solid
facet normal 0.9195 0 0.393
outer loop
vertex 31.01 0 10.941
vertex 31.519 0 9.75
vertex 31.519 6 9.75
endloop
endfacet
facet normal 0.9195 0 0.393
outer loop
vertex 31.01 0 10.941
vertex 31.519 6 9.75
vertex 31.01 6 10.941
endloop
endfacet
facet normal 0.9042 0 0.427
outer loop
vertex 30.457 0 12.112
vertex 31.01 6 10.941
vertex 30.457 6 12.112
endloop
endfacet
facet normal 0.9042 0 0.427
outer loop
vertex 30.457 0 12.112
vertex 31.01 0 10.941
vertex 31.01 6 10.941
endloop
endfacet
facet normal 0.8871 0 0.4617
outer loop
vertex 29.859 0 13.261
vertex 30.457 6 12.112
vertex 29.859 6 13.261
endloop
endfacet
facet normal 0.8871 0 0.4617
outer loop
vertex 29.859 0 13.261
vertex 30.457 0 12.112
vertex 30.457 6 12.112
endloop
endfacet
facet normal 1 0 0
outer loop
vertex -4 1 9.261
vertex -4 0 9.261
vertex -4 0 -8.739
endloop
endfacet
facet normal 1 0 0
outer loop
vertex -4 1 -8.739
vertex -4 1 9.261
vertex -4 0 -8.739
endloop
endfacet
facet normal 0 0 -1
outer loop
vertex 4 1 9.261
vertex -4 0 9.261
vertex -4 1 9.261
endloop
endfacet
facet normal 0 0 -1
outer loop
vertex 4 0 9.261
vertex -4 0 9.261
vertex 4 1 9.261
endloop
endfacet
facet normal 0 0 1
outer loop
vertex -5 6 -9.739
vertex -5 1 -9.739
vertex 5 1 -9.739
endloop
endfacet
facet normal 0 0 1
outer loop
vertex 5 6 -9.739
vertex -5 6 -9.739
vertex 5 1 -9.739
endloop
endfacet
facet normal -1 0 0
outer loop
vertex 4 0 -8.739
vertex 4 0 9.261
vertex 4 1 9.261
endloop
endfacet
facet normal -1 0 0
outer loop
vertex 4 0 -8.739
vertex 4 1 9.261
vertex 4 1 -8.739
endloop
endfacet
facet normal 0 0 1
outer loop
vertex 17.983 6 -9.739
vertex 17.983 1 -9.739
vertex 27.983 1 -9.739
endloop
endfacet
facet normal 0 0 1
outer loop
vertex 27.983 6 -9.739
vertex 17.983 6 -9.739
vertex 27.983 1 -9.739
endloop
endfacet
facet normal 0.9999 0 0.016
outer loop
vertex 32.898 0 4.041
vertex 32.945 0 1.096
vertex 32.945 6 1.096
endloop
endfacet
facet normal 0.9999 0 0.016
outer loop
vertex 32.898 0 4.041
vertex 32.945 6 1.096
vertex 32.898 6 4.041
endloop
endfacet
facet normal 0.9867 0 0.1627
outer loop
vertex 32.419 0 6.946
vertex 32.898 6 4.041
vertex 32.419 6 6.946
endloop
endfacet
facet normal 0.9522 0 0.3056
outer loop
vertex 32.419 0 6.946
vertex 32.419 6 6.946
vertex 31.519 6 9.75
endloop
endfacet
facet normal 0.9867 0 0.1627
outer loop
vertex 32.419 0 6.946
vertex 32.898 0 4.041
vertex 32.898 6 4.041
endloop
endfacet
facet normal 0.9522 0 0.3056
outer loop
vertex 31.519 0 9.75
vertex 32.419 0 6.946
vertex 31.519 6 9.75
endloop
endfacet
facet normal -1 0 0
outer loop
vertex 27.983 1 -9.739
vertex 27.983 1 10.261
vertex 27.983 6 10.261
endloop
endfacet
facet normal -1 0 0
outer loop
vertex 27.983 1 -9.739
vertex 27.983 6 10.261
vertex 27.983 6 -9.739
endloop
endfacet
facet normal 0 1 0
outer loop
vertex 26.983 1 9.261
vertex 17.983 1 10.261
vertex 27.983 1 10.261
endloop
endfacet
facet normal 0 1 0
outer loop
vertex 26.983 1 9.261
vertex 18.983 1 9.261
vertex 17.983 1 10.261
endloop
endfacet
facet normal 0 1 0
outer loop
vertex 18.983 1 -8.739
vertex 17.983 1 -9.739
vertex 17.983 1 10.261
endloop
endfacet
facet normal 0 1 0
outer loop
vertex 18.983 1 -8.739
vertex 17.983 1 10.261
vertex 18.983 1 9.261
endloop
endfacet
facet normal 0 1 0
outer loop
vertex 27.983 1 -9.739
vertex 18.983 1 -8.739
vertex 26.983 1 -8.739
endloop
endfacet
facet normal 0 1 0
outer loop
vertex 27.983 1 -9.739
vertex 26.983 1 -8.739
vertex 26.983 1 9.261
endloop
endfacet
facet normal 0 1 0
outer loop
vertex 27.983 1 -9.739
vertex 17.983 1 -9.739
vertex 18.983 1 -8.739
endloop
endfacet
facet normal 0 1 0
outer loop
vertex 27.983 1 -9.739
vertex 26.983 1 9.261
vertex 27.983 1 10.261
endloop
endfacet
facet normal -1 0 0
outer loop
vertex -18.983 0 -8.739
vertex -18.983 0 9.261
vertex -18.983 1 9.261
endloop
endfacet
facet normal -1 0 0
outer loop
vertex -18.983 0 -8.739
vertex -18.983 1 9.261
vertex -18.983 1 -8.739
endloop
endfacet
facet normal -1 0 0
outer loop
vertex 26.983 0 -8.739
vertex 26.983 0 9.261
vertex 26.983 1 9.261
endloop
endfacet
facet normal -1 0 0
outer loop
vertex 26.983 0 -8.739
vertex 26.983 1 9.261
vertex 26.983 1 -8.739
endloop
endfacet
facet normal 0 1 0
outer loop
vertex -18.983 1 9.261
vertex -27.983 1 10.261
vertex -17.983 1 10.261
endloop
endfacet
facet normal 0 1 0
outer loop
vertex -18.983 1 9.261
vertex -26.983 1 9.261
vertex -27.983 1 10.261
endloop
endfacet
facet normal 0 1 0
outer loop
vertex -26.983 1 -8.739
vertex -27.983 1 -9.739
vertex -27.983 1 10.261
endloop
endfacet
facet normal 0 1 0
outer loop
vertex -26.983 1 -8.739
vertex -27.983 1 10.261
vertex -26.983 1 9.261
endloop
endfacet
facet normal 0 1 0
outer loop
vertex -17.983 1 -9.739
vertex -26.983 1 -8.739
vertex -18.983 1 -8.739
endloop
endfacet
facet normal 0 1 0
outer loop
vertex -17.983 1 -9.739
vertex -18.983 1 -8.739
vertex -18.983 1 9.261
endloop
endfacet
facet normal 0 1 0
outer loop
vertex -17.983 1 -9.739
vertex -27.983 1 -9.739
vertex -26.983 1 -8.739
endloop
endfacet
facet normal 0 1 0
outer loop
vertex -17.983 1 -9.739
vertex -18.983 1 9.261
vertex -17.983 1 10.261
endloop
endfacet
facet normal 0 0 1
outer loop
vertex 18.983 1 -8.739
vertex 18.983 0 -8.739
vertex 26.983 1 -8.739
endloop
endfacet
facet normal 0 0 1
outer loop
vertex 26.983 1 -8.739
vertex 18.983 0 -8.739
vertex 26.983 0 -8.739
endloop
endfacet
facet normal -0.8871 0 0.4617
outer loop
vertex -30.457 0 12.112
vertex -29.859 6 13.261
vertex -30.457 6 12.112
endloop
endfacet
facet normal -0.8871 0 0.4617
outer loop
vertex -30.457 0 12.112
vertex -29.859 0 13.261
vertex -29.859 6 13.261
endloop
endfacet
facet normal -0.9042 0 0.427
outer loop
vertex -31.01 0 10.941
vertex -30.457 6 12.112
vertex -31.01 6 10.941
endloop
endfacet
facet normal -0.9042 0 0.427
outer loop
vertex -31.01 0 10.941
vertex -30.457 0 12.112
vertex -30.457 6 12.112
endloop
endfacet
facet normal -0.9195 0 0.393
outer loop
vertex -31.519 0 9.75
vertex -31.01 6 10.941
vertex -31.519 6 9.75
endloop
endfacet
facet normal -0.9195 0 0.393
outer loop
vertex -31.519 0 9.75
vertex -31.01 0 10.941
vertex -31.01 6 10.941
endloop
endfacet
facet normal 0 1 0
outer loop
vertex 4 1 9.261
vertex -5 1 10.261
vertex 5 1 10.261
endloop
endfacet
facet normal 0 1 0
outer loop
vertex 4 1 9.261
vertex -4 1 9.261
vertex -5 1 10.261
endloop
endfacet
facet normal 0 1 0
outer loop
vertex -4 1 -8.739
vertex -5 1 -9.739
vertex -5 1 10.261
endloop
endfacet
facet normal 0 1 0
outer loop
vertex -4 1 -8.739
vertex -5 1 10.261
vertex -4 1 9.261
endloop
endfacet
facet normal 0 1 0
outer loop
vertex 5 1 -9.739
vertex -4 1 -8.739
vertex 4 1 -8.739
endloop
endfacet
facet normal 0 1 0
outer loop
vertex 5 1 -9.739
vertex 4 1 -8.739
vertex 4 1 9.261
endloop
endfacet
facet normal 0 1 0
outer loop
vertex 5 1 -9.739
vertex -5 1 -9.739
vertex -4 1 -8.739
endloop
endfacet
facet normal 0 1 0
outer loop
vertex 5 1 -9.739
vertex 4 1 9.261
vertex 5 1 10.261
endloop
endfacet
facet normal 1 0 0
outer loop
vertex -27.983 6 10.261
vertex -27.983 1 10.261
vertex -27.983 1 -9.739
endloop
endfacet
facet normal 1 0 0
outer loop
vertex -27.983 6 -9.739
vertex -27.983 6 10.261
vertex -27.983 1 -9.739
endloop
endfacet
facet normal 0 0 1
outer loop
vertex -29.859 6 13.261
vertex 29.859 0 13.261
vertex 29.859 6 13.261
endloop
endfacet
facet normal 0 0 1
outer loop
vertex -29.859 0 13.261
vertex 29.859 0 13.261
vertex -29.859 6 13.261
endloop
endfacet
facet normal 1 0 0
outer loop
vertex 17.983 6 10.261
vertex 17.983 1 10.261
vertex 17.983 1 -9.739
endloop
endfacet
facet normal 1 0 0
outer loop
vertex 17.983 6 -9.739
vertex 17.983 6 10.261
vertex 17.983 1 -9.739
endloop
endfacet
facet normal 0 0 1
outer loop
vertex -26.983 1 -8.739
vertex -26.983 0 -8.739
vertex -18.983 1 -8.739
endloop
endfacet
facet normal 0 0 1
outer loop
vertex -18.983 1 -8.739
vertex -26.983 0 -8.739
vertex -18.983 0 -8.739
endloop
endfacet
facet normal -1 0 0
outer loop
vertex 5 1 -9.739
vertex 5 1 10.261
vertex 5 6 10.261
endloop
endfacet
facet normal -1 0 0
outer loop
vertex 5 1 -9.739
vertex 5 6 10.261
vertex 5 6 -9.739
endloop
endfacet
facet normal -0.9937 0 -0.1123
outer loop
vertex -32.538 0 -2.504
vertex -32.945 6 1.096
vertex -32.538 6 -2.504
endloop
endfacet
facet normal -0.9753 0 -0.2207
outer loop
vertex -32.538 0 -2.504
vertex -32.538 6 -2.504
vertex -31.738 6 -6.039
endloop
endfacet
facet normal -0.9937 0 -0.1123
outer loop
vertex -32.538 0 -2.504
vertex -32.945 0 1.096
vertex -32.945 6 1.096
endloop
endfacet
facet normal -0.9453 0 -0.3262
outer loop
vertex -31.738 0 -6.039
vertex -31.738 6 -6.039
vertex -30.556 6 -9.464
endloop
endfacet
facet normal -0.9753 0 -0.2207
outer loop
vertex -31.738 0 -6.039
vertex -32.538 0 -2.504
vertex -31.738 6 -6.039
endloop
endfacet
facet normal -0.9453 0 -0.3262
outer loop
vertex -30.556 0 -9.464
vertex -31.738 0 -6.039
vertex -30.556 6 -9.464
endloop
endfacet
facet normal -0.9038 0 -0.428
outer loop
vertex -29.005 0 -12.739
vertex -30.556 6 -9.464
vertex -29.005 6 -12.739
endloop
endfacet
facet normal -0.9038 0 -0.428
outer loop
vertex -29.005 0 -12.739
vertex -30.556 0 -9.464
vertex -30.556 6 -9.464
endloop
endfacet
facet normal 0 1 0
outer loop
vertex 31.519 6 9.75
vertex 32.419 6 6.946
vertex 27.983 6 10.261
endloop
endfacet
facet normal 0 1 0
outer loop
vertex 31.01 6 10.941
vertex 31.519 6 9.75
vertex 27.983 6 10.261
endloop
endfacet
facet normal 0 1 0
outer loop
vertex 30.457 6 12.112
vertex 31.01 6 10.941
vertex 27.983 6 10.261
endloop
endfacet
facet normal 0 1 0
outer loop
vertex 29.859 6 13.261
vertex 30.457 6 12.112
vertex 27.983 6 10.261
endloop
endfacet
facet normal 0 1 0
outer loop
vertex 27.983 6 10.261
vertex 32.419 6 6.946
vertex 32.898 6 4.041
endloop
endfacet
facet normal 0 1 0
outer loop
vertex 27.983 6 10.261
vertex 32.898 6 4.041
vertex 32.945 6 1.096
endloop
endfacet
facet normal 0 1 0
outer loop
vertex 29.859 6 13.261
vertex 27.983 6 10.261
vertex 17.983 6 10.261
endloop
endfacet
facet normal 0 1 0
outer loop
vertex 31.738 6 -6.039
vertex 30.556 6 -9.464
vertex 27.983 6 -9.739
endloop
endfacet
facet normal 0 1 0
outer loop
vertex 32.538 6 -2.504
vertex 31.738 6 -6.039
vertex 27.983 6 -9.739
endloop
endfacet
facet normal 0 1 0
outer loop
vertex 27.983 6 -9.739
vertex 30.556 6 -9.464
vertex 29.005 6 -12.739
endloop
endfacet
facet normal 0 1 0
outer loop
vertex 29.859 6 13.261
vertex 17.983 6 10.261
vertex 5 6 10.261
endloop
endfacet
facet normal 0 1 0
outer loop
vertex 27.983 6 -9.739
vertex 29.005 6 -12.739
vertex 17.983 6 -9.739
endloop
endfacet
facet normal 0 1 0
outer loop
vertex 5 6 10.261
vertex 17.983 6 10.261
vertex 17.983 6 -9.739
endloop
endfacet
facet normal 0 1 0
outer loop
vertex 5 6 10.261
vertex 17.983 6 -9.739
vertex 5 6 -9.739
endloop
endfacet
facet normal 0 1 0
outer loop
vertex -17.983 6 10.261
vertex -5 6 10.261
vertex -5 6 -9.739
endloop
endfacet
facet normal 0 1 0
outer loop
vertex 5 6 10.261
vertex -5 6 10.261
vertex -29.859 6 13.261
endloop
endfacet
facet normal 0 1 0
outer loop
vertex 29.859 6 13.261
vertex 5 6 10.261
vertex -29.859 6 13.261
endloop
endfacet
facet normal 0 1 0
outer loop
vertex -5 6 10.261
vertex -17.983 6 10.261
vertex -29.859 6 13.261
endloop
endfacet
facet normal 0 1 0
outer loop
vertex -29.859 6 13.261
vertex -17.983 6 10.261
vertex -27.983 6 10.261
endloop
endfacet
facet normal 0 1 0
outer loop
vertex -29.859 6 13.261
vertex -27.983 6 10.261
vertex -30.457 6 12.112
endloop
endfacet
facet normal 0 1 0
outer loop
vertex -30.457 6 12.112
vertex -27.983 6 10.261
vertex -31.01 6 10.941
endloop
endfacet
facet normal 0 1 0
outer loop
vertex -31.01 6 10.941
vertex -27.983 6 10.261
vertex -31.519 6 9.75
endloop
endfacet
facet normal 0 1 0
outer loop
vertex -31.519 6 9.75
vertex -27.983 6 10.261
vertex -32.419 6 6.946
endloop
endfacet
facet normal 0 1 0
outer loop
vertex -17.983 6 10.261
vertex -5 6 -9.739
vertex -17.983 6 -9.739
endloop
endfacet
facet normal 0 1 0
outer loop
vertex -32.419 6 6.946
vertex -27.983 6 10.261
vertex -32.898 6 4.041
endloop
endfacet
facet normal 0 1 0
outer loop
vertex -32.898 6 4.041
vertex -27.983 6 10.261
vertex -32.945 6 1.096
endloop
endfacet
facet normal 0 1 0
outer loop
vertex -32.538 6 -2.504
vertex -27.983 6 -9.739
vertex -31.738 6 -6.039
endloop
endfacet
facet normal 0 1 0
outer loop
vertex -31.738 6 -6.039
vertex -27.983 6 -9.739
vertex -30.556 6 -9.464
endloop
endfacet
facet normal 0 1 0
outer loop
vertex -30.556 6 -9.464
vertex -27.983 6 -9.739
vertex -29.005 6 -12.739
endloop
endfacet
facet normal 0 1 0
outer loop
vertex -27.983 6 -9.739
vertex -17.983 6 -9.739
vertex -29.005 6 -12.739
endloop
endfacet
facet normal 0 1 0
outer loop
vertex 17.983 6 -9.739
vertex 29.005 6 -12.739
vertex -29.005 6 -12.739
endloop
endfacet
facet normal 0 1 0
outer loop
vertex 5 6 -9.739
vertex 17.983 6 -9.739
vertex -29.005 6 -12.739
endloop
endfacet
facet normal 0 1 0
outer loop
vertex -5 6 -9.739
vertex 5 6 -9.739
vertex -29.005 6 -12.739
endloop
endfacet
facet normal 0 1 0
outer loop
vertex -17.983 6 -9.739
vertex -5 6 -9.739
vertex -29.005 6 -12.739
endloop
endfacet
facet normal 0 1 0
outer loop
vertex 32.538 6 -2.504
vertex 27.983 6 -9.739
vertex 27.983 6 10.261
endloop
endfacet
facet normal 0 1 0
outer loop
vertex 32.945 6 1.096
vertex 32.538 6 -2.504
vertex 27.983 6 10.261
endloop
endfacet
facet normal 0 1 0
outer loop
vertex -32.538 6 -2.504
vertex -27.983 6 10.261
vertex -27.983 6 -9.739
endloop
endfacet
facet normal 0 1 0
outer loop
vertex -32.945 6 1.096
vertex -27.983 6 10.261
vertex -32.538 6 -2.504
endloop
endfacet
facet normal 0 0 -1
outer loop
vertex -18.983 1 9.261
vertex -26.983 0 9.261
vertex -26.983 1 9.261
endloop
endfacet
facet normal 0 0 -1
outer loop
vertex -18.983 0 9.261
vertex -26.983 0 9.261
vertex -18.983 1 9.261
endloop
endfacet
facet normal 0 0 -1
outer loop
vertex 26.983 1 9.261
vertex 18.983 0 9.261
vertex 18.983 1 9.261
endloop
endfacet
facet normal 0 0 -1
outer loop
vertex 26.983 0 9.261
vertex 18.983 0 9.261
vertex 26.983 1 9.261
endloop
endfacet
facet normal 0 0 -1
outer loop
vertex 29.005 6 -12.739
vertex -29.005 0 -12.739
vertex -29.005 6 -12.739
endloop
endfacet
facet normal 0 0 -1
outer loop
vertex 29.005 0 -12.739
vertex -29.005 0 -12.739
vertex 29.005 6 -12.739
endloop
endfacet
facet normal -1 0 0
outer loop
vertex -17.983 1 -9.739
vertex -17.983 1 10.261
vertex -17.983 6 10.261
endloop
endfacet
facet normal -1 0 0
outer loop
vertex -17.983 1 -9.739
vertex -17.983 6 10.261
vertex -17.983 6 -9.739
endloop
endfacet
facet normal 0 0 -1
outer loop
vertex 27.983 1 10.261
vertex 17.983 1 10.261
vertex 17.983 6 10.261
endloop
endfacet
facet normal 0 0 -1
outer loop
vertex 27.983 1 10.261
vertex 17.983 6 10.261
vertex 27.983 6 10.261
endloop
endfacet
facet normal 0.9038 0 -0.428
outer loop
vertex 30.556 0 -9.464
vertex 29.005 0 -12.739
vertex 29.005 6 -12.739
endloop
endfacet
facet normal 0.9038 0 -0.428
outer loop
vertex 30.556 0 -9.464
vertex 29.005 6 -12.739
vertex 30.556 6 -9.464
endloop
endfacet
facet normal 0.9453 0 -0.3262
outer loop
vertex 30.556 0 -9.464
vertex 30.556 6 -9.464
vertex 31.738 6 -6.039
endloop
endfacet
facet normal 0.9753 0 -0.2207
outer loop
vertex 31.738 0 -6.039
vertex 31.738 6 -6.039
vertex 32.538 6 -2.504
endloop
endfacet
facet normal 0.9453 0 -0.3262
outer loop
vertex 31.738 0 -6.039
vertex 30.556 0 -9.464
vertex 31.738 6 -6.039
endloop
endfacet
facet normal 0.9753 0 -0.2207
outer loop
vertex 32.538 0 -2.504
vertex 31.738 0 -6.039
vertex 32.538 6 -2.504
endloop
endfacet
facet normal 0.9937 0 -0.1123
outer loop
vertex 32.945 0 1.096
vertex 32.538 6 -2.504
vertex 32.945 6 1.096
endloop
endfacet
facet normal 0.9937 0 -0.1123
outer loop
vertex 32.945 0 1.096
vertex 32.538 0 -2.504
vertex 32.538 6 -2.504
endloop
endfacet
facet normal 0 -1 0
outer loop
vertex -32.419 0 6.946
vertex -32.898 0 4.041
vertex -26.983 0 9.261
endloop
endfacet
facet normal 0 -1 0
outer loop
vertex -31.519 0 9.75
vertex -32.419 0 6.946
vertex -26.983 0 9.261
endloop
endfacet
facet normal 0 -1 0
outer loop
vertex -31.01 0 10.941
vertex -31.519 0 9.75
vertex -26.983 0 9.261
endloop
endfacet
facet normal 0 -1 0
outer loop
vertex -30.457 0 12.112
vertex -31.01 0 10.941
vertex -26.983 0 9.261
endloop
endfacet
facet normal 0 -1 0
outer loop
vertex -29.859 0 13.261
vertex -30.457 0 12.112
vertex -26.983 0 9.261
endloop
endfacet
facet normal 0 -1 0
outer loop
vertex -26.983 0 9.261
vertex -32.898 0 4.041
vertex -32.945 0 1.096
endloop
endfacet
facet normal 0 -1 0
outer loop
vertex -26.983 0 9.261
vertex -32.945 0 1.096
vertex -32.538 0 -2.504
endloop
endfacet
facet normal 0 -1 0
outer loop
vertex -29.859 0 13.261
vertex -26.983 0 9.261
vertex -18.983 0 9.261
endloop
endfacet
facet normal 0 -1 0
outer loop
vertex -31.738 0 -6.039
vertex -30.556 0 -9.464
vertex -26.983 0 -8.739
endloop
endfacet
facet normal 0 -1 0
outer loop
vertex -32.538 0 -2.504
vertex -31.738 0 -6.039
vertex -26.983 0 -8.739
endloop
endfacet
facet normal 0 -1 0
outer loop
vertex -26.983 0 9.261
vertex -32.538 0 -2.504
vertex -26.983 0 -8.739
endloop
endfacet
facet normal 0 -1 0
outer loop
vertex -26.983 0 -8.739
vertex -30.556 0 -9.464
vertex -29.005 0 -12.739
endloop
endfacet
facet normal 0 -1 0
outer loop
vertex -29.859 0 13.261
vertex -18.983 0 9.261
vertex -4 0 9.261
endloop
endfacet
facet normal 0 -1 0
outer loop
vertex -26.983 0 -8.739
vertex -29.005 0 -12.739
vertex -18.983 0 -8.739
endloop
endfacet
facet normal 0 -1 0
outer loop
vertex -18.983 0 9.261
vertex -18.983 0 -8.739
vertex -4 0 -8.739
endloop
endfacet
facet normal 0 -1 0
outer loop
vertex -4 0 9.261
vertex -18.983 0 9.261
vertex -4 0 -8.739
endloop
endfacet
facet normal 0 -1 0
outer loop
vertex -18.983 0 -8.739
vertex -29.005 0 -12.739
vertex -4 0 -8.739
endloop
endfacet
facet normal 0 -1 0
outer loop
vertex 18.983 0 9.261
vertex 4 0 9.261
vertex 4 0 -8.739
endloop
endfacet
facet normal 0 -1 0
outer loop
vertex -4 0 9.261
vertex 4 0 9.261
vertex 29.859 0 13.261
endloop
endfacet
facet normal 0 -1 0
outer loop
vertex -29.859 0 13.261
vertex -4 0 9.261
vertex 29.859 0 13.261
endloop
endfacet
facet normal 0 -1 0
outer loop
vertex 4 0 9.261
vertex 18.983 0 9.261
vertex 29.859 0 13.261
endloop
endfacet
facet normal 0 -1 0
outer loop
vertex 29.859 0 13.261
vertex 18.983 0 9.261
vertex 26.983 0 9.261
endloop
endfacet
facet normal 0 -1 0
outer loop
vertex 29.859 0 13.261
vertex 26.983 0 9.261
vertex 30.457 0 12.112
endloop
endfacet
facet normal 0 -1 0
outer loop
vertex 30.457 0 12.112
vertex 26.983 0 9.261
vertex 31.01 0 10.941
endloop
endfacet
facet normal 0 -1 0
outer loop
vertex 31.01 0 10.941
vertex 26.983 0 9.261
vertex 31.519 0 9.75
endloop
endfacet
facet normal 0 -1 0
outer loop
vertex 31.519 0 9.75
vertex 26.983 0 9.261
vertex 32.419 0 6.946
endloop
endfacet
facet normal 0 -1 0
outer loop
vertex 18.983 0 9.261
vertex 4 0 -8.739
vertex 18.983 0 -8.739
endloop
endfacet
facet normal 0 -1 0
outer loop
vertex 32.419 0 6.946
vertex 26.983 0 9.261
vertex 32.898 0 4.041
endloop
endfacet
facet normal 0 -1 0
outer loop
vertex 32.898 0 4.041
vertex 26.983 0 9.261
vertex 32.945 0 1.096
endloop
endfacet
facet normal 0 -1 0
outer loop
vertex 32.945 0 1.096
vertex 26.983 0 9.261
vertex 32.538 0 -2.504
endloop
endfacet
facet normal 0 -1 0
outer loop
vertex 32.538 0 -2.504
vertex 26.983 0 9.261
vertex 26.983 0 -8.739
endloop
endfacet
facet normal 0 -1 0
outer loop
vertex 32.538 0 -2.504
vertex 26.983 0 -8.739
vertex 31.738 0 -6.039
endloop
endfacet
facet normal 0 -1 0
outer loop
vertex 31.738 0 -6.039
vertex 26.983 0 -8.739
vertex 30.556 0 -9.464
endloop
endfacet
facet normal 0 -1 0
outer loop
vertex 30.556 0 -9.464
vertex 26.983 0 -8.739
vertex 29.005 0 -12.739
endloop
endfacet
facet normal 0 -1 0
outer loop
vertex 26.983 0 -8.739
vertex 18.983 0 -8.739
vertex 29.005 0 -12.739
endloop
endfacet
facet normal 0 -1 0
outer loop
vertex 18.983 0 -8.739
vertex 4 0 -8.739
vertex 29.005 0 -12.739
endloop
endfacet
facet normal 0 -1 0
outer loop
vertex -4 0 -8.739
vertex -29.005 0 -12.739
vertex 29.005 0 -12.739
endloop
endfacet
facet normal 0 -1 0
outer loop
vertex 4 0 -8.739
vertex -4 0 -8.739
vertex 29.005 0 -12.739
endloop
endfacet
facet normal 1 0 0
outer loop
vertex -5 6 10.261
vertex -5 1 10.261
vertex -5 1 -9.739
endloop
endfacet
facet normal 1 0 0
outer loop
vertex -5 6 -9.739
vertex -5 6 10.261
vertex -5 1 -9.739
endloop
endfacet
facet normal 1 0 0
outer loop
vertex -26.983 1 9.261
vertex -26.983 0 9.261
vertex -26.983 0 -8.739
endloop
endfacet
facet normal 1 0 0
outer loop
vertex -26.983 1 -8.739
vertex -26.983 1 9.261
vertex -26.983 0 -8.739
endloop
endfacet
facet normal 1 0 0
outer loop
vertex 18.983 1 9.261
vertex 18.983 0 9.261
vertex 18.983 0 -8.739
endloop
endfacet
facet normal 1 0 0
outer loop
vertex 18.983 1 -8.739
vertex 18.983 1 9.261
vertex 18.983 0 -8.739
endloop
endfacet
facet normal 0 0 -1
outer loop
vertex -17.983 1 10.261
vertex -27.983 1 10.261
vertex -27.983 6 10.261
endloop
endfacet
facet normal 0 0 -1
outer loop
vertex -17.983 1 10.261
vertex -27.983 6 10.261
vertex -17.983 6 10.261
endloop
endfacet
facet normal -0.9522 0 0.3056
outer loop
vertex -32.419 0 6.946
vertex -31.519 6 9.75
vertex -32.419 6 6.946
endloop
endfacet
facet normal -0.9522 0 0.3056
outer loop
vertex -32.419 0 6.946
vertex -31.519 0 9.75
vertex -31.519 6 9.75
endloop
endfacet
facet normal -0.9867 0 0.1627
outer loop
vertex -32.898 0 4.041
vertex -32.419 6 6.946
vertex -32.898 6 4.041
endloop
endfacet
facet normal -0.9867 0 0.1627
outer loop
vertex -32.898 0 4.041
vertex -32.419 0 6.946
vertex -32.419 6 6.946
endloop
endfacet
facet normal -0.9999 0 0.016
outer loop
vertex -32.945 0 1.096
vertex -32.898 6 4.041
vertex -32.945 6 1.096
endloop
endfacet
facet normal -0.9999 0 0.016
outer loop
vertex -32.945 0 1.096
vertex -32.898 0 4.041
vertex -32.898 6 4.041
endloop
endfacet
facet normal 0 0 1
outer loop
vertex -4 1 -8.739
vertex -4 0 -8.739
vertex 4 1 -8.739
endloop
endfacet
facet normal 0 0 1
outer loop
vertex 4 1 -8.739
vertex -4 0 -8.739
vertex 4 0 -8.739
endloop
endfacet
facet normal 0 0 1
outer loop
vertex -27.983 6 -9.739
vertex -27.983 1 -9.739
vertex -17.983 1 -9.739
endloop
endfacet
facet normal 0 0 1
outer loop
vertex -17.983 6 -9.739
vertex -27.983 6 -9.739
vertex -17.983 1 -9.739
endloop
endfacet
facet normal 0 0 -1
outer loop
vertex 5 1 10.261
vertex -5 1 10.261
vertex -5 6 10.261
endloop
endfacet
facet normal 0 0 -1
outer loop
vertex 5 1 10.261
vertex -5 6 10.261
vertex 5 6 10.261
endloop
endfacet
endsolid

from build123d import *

# Parameters (mm, degrees)
ESQUISSE1_W        = 8
ESQUISSE1_H        = 18
BOSS_EXTRU_1_DEPTH = 1
ESQUISSE2_W        = 10
ESQUISSE2_H        = 20
BOSS_EXTRU_2_DEPTH = 5


with BuildPart() as part:
    # Esquisse1 → Boss.-Extru.1 (new body)
    with BuildSketch(Plane(origin=(0, 0, 0), x_dir=(1, 0, 0), z_dir=(0, 1, 0))):
        with BuildLine():
            Line((29.004988077, 12.738826724), (-29.004988077, 12.738826724))
            ThreePointArc((-29.004988077, 12.738826724), (-31.738037586, 6.038637628), (-32.945035587, -1.096153846))
            ThreePointArc((-32.945035587, -1.096153846), (-32.712152787, -5.502218178), (-31.51884357, -9.75))
            ThreePointArc((-31.51884357, -9.75), (-30.739215763, -11.52930192), (-29.859240507, -13.261173276))
            Line((-29.859240507, -13.261173276), (29.859240507, -13.261173276))
            ThreePointArc((29.859240507, -13.261173276), (30.739215763, -11.52930192), (31.51884357, -9.75))
            ThreePointArc((31.51884357, -9.75), (32.712152787, -5.502218178), (32.945035587, -1.096153846))
            ThreePointArc((32.945035587, -1.096153846), (31.738037586, 6.038637628), (29.004988077, 12.738826724))
        make_face()
        with Locations((22.983419658, -0.261173276)):
            Rectangle(ESQUISSE1_W, ESQUISSE1_H, mode=Mode.SUBTRACT)
        with Locations((-22.983419658, -0.261173276)):
            Rectangle(ESQUISSE1_W, ESQUISSE1_H, mode=Mode.SUBTRACT)
        with Locations((0, -0.261173276)):
            Rectangle(ESQUISSE1_W, ESQUISSE1_H, mode=Mode.SUBTRACT)
    extrude(amount=BOSS_EXTRU_1_DEPTH)

    # Esquisse2 → Boss.-Extru.2 (add)
    with BuildSketch(Plane(origin=(0, 1, 0), x_dir=(1, 0, 0), z_dir=(0, 1, 0))):
        with BuildLine():
            Line((-29.004988077, 12.738826724), (29.004988077, 12.738826724))
            ThreePointArc((29.004988077, 12.738826724), (31.738037586, 6.038637628), (32.945035587, -1.096153846))
            ThreePointArc((32.945035587, -1.096153846), (32.712152787, -5.502218178), (31.51884357, -9.75))
            ThreePointArc((31.51884357, -9.75), (30.739215763, -11.52930192), (29.859240507, -13.261173276))
            Line((29.859240507, -13.261173276), (0, -13.261173276))
            Line((0, -13.261173276), (-29.859240507, -13.261173276))
            ThreePointArc((-29.859240507, -13.261173276), (-30.739215763, -11.52930192), (-31.51884357, -9.75))
            ThreePointArc((-31.51884357, -9.75), (-32.712152787, -5.502218178), (-32.945035587, -1.096153846))
            ThreePointArc((-32.945035587, -1.096153846), (-31.738037586, 6.038637628), (-29.004988077, 12.738826724))
        make_face()
        with Locations((-22.983419658, -0.261173276)):
            Rectangle(ESQUISSE2_W, ESQUISSE2_H, mode=Mode.SUBTRACT)
        with Locations((22.983419658, -0.261173276)):
            Rectangle(ESQUISSE2_W, ESQUISSE2_H, mode=Mode.SUBTRACT)
        with Locations((0, -0.261173276)):
            Rectangle(ESQUISSE2_W, ESQUISSE2_H, mode=Mode.SUBTRACT)
    extrude(amount=BOSS_EXTRU_2_DEPTH)


solid = part.part
